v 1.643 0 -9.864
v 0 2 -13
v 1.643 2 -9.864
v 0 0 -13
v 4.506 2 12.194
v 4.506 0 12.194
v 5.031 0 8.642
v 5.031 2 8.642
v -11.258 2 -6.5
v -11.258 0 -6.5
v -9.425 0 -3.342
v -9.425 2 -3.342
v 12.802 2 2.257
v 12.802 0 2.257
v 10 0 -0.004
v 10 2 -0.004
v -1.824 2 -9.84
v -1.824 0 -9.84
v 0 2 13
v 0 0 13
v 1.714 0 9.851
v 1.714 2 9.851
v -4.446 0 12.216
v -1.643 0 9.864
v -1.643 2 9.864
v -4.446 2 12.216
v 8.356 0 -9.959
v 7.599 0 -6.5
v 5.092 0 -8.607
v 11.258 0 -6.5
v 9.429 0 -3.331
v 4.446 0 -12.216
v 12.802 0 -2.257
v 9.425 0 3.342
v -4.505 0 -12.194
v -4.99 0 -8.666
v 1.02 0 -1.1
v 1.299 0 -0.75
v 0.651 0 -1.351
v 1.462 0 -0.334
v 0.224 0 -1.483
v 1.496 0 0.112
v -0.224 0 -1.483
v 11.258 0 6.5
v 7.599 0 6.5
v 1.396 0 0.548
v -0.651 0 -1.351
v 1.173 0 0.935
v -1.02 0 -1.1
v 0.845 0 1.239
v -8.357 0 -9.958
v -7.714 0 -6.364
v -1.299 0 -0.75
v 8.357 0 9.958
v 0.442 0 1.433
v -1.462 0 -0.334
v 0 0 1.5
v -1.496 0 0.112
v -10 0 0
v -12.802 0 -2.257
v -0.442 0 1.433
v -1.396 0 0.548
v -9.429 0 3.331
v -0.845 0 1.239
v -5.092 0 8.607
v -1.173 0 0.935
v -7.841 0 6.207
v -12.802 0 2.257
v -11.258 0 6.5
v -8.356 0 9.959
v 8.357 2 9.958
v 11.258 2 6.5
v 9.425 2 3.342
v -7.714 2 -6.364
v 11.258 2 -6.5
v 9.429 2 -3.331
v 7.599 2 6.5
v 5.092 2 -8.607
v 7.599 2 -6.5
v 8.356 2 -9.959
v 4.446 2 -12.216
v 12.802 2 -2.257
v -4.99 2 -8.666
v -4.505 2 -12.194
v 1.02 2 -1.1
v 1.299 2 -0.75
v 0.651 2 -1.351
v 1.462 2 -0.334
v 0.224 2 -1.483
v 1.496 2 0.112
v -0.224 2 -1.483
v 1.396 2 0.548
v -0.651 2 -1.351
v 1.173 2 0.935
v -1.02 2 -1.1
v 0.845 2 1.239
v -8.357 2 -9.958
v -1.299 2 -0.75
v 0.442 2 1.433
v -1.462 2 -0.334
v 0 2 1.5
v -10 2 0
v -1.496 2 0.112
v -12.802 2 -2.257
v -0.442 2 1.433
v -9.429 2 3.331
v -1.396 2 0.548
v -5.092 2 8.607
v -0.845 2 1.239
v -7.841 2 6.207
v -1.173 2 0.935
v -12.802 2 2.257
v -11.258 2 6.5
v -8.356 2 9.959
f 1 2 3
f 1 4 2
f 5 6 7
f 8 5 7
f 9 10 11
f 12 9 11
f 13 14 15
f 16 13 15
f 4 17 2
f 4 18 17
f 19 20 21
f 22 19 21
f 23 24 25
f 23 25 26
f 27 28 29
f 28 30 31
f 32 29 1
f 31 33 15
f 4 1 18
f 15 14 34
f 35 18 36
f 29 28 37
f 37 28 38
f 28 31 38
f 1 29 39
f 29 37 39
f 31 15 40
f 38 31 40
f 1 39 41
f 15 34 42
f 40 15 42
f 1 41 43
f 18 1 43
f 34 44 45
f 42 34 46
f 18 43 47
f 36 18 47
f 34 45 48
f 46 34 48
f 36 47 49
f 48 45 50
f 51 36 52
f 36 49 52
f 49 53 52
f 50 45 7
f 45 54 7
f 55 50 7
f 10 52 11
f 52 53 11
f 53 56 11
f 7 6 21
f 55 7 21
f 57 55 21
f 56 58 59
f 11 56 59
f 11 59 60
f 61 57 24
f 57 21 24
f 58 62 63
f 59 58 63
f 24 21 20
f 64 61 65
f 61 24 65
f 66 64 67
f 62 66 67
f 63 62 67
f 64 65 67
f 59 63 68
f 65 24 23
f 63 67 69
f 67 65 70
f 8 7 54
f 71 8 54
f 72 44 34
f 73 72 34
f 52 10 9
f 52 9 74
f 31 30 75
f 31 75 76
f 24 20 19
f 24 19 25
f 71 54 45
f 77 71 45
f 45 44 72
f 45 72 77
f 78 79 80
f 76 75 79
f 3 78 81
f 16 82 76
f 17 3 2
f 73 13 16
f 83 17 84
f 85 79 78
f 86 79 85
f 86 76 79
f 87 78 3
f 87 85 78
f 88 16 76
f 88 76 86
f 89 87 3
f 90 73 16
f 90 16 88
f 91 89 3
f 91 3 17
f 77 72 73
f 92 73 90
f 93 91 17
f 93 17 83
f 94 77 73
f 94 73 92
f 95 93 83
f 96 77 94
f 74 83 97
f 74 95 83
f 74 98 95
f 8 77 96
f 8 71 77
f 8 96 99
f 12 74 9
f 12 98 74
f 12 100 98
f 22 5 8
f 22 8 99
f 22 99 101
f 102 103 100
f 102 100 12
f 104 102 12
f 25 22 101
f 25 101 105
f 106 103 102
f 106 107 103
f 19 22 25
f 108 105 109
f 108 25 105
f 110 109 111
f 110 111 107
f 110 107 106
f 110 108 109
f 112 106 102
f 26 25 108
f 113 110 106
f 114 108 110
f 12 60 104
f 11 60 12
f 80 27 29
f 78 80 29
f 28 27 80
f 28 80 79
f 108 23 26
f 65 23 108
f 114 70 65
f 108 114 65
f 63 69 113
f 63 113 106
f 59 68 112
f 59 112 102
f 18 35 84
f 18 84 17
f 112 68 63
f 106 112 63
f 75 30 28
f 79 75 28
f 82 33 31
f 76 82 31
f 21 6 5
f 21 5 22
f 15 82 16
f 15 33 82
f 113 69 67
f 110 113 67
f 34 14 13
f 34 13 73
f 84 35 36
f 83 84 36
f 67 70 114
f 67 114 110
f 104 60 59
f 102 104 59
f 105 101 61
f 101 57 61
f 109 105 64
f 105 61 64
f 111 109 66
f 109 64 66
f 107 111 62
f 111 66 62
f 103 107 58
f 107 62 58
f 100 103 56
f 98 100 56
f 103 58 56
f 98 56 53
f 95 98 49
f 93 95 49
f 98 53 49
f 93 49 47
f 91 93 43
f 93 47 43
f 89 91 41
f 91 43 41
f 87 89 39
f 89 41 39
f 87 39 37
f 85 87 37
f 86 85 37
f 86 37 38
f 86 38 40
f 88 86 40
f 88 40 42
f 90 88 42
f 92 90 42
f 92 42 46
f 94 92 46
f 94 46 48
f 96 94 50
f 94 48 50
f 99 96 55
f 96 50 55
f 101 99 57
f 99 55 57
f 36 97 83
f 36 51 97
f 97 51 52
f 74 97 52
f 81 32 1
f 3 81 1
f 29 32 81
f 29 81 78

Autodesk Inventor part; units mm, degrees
ref_plane "YZ Plane" through (0, 0, 0) normal (1, 0, 0) x (0, 1, 0)
ref_plane "XZ Plane" through (0, 0, 0) normal (0, 1, 0) x (-1, 0, 0)
ref_plane "XY Plane" through (0, 0, 0) normal (0, 0, 1) x (1, 0, 0)
sketch "Szkic1" plane through (0, 0, 0) normal (0, 1, 0) x (-1, 0, 0)
  line L0 (0, 12.8914) -> (0, 13)
  line L1 (4.409, 12.114) -> (4.4461, 12.216)
  line L2 (0, 0) -> (13, 0) construction
  line L3 (0, 0) -> (13, 0) construction
  line L4 (12.8025, -2.2574) -> (12.7826, -2.312)
  line L5 (0, -13) -> (0.0571, -12.9898)
  line L6 (0, 13) -> (-1.7143, 9.8513)
  line L7 (-4.506, 12.1936) -> (-1.7143, 9.8513)
  line L8 (-4.506, 12.1936) -> (-5.0309, 8.6423)
  line L9 (-5.0309, 8.6423) -> (-8.3572, 9.9584)
  line L10 (-8.3572, 9.9584) -> (-7.5993, 6.5)
  line L11 (-11.2583, 6.5) -> (-7.5993, 6.5)
  line L12 (-12.8025, 2.2574) -> (-9.4249, 3.3421)
  line L13 (-11.2583, 6.5) -> (-9.4249, 3.3421)
  line L14 (-12.8025, 2.2574) -> (-10, -0.0042)
  line L15 (-12.8025, -2.2574) -> (-10, -0.0042)
  line L16 (-4.4461, -12.216) -> (-1.6431, -9.864)
  line L17 (0, -13) -> (-1.6431, -9.864)
  line L18 (4.5054, -12.1944) -> (1.8242, -9.8405)
  line L19 (1.8242, -9.8405) -> (0, -13)
  line L20 (-8.3562, -9.9586) -> (-5.0917, -8.6067)
  line L21 (-4.4461, -12.216) -> (-5.0917, -8.6067)
  line L22 (-8.3562, -9.9586) -> (-7.5993, -6.5)
  line L23 (-11.2583, -6.5) -> (-7.5993, -6.5)
  line L24 (-11.2583, -6.5) -> (-9.4288, -3.3312)
  line L25 (-12.8025, -2.2574) -> (-9.4288, -3.3312)
  line L26 (4.5054, -12.1944) -> (4.9903, -8.6659)
  line L27 (8.3572, -9.9584) -> (4.9903, -8.6659)
  line L28 (8.3572, -9.9584) -> (7.7142, -6.364)
  line L29 (11.2583, -6.5) -> (7.7142, -6.364)
  line L30 (11.2583, -6.5) -> (9.425, -3.3422)
  line L31 (12.8025, -2.2574) -> (9.425, -3.3422)
  line L32 (0, 13) -> (1.6431, 9.864)
  line L33 (1.6431, 9.864) -> (4.4461, 12.216)
  line L34 (4.4461, 12.216) -> (5.0917, 8.6067)
  line L35 (8.3562, 9.9586) -> (5.0917, 8.6067)
  line L36 (8.3562, 9.9586) -> (7.8406, 6.2068)
  line L37 (11.2583, 6.5) -> (7.8406, 6.2068)
  line L38 (12.8025, 2.2574) -> (9.4288, 3.3312)
  line L39 (11.2583, 6.5) -> (9.4288, 3.3312)
  line L40 (12.8025, -2.2574) -> (10, 0)
  line L41 (12.8025, 2.2574) -> (10, 0)
  line L42 (-0.0571, 12.9898) -> (0, 13)
  arc A0 (5.0917, 8.6067) -> (5.0298, 8.643) centre (0, 0) ccw
  line L43 (-8.4028, 9.904) -> (-8.3572, 9.9584)
  line L44 (8.4028, -9.904) -> (8.3572, -9.9584)
extrude "Wyciągnięcie proste1" add sketch "Szkic1" along normal blind 2
sketch "Szkic2" plane through (0, 2, 0) normal (0, 1, 0) x (1, 0, 0)
  circle A0 centre (0, 0) radius 1.5
  dimension "d9" = 3
hole "Otwór1" at (0, 2, 0) direction (0, -1, 0) diameter 3 depth 8 tip angle 118
properties part number "zebatka" material "Stal"
